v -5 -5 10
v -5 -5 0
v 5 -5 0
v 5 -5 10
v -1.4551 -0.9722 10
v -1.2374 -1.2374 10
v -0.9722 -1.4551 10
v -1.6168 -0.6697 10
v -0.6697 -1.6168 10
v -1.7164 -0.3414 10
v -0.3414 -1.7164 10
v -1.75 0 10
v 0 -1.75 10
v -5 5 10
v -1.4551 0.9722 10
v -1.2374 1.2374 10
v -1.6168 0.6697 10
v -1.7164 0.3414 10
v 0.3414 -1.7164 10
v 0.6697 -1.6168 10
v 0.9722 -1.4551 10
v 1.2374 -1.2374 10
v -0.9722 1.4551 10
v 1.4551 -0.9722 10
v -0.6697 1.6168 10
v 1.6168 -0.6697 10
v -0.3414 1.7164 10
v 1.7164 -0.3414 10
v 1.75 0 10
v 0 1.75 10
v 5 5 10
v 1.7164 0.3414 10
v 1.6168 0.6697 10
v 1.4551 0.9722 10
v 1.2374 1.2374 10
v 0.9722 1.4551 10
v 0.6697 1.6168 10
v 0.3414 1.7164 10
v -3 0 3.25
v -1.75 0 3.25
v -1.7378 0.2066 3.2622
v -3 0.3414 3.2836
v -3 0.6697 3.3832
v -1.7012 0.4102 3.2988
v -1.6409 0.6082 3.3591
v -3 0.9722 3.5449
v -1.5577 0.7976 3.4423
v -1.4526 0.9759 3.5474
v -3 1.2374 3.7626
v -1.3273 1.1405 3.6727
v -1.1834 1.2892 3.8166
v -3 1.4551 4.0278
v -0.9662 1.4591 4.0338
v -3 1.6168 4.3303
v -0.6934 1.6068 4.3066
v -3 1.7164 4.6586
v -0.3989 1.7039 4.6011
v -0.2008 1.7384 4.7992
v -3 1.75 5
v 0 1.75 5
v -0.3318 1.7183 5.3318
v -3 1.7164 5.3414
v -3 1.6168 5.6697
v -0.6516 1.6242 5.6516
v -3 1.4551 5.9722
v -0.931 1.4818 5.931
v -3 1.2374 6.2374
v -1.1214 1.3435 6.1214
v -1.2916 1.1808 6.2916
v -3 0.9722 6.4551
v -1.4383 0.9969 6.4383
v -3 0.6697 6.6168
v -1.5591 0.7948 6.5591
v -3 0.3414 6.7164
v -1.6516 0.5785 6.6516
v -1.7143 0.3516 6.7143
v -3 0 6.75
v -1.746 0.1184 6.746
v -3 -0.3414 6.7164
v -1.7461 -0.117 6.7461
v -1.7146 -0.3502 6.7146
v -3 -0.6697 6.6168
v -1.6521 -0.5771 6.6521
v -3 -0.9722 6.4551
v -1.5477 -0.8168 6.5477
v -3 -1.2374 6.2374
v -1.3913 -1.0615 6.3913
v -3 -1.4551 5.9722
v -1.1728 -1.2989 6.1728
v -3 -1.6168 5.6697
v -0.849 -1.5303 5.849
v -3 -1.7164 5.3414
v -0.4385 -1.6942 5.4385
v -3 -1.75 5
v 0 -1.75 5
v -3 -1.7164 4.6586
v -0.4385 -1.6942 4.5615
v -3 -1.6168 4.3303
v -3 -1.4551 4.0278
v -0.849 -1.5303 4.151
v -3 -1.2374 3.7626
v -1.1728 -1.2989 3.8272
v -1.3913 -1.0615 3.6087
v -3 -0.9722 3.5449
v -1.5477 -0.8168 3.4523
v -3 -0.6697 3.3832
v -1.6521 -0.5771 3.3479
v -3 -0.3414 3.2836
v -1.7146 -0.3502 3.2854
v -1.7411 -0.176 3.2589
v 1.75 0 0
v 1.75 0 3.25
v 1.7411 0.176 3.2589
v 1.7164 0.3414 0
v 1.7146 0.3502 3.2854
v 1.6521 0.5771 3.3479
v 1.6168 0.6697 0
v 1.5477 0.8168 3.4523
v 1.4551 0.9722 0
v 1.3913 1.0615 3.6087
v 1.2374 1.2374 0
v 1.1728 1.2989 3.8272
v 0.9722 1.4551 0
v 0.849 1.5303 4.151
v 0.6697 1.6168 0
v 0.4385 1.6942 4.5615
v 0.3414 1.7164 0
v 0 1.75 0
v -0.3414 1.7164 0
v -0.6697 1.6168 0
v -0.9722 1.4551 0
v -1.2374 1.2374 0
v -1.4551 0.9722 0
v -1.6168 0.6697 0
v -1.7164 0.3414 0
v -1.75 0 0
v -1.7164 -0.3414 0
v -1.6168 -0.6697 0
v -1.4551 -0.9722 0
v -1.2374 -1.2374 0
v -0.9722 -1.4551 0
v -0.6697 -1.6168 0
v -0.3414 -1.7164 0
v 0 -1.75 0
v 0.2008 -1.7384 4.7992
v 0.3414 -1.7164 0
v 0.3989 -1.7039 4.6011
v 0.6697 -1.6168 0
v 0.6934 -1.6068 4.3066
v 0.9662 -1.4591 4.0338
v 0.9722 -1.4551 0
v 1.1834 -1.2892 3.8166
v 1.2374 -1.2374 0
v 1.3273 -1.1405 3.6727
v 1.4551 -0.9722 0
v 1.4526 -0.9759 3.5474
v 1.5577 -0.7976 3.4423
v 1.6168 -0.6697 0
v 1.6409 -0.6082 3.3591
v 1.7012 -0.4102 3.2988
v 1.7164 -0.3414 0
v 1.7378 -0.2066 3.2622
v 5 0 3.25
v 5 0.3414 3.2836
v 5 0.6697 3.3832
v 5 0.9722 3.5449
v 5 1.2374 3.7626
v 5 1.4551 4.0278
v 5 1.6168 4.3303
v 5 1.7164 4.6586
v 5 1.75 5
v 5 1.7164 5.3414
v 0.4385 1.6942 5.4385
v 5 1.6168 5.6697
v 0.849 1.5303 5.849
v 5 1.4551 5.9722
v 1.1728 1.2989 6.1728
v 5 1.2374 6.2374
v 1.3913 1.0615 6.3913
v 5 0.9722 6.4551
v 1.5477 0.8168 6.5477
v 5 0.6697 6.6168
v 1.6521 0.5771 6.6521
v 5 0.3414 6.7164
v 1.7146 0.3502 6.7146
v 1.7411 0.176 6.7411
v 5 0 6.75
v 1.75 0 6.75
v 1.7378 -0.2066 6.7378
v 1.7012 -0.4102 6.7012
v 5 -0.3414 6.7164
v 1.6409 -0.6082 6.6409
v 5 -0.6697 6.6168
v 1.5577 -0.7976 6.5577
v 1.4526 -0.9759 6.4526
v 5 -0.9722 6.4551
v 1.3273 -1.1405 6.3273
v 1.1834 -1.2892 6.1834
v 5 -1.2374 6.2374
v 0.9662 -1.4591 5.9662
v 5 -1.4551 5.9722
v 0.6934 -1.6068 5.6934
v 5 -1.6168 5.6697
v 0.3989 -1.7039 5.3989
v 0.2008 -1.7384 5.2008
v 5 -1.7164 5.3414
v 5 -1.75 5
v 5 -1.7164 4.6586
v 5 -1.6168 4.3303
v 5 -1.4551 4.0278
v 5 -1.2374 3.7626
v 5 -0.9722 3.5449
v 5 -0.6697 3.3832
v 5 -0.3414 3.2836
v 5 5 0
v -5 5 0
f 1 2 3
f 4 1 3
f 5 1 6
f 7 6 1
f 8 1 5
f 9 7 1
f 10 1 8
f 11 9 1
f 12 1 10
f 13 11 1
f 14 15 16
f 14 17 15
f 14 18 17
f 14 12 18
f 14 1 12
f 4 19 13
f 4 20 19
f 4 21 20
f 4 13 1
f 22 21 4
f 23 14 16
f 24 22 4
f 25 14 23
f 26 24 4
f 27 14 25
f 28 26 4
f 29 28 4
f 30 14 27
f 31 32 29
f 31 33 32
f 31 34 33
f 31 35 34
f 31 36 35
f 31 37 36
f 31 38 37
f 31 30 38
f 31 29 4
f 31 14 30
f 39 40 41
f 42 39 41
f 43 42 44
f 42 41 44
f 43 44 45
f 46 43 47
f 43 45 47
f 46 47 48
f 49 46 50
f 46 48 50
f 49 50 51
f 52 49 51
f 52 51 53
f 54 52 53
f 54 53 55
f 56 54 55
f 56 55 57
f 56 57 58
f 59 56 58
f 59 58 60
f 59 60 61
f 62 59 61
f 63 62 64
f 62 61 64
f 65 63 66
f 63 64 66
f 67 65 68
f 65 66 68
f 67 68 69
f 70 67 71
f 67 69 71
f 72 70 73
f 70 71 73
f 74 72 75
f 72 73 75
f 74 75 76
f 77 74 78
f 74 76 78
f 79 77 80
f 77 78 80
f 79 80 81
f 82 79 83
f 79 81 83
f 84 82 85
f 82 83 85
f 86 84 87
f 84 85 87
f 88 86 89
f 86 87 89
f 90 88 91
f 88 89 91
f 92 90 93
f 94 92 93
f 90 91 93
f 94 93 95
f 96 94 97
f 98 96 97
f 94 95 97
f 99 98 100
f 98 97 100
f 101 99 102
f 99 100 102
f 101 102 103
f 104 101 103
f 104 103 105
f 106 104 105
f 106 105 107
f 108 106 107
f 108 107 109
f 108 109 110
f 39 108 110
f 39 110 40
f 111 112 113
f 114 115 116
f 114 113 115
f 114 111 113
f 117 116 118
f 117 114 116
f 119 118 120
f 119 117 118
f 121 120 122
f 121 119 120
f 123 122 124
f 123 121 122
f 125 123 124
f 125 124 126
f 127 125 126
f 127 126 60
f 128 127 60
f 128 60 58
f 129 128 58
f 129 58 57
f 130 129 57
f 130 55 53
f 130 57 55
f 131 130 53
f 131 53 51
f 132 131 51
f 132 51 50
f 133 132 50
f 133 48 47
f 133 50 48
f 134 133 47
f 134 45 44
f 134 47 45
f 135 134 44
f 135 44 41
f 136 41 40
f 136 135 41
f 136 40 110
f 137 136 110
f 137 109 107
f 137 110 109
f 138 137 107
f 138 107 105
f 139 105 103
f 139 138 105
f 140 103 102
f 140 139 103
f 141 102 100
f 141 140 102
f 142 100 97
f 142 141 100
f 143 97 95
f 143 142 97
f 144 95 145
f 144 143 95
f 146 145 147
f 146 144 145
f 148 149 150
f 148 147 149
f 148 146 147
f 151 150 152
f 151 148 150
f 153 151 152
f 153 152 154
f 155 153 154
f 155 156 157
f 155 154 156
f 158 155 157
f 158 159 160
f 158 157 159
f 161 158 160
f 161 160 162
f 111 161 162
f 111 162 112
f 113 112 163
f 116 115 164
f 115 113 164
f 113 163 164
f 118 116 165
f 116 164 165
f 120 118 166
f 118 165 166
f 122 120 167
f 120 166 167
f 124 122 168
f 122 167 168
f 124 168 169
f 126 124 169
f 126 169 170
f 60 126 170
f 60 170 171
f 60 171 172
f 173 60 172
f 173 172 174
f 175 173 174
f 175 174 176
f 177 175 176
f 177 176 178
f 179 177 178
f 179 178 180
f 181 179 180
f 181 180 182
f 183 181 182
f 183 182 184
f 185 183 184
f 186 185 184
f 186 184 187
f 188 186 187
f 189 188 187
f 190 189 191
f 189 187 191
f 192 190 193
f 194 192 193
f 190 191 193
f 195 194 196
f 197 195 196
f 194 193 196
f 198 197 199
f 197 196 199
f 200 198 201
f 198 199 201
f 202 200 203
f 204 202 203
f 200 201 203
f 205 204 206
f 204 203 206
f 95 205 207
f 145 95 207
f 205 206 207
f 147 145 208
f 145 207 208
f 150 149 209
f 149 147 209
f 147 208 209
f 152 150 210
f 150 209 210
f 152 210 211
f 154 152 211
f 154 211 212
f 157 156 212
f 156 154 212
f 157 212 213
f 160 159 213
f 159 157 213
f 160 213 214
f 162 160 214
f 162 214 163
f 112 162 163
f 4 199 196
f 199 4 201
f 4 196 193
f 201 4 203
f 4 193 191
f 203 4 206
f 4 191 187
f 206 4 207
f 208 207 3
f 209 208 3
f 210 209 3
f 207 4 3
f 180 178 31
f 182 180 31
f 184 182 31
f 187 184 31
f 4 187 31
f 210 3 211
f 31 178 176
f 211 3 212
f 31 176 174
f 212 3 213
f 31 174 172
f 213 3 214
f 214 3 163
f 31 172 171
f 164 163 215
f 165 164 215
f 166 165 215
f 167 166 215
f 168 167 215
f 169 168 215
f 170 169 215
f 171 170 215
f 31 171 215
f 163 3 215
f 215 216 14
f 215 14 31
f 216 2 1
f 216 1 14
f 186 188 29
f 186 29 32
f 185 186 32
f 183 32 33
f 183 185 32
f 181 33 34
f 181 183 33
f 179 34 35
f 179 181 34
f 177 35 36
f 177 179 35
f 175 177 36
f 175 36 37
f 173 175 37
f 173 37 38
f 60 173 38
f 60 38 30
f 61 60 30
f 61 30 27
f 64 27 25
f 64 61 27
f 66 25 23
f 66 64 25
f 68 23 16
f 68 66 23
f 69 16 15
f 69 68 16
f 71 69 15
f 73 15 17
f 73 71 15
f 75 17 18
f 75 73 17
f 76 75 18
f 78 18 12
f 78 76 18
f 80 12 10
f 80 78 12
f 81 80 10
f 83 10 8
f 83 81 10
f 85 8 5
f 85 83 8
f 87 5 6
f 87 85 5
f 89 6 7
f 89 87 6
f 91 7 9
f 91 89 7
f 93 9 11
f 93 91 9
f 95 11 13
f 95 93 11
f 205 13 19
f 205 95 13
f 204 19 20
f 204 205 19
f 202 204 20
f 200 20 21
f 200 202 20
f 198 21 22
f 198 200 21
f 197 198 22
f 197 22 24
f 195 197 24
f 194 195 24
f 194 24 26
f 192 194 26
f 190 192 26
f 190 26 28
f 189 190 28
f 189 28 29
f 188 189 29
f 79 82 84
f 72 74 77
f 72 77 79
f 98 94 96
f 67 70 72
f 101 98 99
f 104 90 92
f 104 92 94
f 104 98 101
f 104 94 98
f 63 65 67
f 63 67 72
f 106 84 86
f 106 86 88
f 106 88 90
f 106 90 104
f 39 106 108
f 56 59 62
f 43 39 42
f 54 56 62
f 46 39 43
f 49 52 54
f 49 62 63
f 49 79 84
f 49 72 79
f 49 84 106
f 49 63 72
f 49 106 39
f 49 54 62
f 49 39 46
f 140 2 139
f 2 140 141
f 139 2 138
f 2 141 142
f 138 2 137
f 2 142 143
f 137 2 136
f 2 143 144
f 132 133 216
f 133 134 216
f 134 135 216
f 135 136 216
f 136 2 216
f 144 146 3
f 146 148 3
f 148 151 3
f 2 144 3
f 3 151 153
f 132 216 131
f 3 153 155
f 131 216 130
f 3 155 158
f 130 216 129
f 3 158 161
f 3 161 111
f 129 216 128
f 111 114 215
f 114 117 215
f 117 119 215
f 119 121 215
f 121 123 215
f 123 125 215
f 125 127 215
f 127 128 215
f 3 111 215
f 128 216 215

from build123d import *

# Parameters (mm, degrees)
SKETCH1_W           = 10
SKETCH1_H           = 10
SKETCH1_R           = 1.75
BOSS_EXTRUDE1_DEPTH = 10
SKETCH2_R           = 1.75
CUT_EXTRUDE1_DEPTH  = 8


with BuildPart() as part:
    # Sketch1 → Boss-Extrude1 (new body)
    with BuildSketch(Plane.XY):
        Rectangle(SKETCH1_W, SKETCH1_H)
        Circle(SKETCH1_R, mode=Mode.SUBTRACT)
    extrude(amount=BOSS_EXTRUDE1_DEPTH)

    # Sketch2 → Cut-Extrude1 (cut)
    with BuildSketch(Plane(origin=(5, 0, 0), x_dir=(0, 0, -1), z_dir=(1, 0, 0))):
        with Locations((-5, 0)):
            Circle(SKETCH2_R)
    extrude(amount=-CUT_EXTRUDE1_DEPTH, mode=Mode.SUBTRACT)


solid = part.part
